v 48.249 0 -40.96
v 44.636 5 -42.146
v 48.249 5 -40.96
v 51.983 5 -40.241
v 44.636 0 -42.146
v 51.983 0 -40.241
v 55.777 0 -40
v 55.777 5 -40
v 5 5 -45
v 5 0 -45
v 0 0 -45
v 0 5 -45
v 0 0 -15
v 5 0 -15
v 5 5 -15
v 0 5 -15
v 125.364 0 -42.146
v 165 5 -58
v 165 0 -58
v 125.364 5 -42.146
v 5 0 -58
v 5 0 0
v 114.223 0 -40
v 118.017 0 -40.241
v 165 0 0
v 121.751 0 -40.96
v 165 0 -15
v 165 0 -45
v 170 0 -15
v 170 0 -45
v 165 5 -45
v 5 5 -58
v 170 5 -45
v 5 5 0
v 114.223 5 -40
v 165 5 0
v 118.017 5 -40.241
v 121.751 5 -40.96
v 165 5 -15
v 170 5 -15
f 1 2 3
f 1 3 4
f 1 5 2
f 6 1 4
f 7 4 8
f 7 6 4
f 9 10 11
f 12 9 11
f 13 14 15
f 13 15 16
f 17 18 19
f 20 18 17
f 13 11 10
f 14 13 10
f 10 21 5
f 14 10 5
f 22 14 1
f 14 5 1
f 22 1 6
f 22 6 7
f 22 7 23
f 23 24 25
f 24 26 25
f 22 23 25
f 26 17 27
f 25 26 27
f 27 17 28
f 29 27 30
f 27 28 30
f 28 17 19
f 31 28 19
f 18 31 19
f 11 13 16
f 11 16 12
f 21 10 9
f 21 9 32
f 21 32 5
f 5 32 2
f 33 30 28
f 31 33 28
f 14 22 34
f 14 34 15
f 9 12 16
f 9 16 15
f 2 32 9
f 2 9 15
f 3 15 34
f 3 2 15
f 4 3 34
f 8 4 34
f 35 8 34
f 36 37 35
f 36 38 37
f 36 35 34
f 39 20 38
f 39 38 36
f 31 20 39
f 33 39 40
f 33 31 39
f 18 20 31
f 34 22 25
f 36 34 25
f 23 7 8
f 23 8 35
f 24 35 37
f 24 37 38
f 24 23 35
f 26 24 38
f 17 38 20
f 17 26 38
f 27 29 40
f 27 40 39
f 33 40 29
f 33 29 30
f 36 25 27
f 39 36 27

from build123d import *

# Parameters (mm, degrees)
SKETCH_1_W          = 170
SKETCH_1_H          = 40
EXTRUDE_1_DEPTH     = 5
EXTRUDE_2_DEPTH     = 5
FILLET_1_R          = 30
SKETCH_3_W          = 5
SKETCH_3_H          = 15
CUT_EXTRUDE_1_DEPTH = 10


with BuildPart() as part:
    # 스케치1 → 보스-돌출1 (new body)
    with BuildSketch(Plane(origin=(0, 0, 0), x_dir=(1, 0, 0), z_dir=(0, 1, 0))):
        with Locations((85, 20)):
            Rectangle(SKETCH_1_W, SKETCH_1_H)
    extrude(amount=EXTRUDE_1_DEPTH)

    # 스케치2 → 보스-돌출2 (add)
    with BuildSketch(Plane(origin=(0, 5, 0), x_dir=(1, 0, 0), z_dir=(0, 1, 0))):
        Polygon((170, 40), (170, 60), (120, 40), align=None)
        Polygon((0, 40), (0, 60), (50, 40), align=None)
    extrude(amount=-EXTRUDE_2_DEPTH)

    # 필렛1
    fillet_1_edges = [part.edges().sort_by_distance(p)[0] for p in [
        (120, 2.5, -40),
        (50, 2.5, -40),
    ]]
    fillet(fillet_1_edges, radius=FILLET_1_R)

    # 스케치3 → 컷-돌출1 (cut)
    with BuildSketch(Plane(origin=(0, 0, 0), x_dir=(-1, 0, 0), z_dir=(0, -1, 0))):
        with Locations((-2.5, 52.5)):
            Rectangle(SKETCH_3_W, SKETCH_3_H)
        with Locations((-2.5, 7.5)):
            Rectangle(SKETCH_3_W, SKETCH_3_H)
        with Locations((-167.5, 52.5)):
            Rectangle(SKETCH_3_W, SKETCH_3_H)
        with Locations((-167.5, 7.5)):
            Rectangle(SKETCH_3_W, SKETCH_3_H)
    extrude(amount=-CUT_EXTRUDE_1_DEPTH, mode=Mode.SUBTRACT)


solid = part.part
